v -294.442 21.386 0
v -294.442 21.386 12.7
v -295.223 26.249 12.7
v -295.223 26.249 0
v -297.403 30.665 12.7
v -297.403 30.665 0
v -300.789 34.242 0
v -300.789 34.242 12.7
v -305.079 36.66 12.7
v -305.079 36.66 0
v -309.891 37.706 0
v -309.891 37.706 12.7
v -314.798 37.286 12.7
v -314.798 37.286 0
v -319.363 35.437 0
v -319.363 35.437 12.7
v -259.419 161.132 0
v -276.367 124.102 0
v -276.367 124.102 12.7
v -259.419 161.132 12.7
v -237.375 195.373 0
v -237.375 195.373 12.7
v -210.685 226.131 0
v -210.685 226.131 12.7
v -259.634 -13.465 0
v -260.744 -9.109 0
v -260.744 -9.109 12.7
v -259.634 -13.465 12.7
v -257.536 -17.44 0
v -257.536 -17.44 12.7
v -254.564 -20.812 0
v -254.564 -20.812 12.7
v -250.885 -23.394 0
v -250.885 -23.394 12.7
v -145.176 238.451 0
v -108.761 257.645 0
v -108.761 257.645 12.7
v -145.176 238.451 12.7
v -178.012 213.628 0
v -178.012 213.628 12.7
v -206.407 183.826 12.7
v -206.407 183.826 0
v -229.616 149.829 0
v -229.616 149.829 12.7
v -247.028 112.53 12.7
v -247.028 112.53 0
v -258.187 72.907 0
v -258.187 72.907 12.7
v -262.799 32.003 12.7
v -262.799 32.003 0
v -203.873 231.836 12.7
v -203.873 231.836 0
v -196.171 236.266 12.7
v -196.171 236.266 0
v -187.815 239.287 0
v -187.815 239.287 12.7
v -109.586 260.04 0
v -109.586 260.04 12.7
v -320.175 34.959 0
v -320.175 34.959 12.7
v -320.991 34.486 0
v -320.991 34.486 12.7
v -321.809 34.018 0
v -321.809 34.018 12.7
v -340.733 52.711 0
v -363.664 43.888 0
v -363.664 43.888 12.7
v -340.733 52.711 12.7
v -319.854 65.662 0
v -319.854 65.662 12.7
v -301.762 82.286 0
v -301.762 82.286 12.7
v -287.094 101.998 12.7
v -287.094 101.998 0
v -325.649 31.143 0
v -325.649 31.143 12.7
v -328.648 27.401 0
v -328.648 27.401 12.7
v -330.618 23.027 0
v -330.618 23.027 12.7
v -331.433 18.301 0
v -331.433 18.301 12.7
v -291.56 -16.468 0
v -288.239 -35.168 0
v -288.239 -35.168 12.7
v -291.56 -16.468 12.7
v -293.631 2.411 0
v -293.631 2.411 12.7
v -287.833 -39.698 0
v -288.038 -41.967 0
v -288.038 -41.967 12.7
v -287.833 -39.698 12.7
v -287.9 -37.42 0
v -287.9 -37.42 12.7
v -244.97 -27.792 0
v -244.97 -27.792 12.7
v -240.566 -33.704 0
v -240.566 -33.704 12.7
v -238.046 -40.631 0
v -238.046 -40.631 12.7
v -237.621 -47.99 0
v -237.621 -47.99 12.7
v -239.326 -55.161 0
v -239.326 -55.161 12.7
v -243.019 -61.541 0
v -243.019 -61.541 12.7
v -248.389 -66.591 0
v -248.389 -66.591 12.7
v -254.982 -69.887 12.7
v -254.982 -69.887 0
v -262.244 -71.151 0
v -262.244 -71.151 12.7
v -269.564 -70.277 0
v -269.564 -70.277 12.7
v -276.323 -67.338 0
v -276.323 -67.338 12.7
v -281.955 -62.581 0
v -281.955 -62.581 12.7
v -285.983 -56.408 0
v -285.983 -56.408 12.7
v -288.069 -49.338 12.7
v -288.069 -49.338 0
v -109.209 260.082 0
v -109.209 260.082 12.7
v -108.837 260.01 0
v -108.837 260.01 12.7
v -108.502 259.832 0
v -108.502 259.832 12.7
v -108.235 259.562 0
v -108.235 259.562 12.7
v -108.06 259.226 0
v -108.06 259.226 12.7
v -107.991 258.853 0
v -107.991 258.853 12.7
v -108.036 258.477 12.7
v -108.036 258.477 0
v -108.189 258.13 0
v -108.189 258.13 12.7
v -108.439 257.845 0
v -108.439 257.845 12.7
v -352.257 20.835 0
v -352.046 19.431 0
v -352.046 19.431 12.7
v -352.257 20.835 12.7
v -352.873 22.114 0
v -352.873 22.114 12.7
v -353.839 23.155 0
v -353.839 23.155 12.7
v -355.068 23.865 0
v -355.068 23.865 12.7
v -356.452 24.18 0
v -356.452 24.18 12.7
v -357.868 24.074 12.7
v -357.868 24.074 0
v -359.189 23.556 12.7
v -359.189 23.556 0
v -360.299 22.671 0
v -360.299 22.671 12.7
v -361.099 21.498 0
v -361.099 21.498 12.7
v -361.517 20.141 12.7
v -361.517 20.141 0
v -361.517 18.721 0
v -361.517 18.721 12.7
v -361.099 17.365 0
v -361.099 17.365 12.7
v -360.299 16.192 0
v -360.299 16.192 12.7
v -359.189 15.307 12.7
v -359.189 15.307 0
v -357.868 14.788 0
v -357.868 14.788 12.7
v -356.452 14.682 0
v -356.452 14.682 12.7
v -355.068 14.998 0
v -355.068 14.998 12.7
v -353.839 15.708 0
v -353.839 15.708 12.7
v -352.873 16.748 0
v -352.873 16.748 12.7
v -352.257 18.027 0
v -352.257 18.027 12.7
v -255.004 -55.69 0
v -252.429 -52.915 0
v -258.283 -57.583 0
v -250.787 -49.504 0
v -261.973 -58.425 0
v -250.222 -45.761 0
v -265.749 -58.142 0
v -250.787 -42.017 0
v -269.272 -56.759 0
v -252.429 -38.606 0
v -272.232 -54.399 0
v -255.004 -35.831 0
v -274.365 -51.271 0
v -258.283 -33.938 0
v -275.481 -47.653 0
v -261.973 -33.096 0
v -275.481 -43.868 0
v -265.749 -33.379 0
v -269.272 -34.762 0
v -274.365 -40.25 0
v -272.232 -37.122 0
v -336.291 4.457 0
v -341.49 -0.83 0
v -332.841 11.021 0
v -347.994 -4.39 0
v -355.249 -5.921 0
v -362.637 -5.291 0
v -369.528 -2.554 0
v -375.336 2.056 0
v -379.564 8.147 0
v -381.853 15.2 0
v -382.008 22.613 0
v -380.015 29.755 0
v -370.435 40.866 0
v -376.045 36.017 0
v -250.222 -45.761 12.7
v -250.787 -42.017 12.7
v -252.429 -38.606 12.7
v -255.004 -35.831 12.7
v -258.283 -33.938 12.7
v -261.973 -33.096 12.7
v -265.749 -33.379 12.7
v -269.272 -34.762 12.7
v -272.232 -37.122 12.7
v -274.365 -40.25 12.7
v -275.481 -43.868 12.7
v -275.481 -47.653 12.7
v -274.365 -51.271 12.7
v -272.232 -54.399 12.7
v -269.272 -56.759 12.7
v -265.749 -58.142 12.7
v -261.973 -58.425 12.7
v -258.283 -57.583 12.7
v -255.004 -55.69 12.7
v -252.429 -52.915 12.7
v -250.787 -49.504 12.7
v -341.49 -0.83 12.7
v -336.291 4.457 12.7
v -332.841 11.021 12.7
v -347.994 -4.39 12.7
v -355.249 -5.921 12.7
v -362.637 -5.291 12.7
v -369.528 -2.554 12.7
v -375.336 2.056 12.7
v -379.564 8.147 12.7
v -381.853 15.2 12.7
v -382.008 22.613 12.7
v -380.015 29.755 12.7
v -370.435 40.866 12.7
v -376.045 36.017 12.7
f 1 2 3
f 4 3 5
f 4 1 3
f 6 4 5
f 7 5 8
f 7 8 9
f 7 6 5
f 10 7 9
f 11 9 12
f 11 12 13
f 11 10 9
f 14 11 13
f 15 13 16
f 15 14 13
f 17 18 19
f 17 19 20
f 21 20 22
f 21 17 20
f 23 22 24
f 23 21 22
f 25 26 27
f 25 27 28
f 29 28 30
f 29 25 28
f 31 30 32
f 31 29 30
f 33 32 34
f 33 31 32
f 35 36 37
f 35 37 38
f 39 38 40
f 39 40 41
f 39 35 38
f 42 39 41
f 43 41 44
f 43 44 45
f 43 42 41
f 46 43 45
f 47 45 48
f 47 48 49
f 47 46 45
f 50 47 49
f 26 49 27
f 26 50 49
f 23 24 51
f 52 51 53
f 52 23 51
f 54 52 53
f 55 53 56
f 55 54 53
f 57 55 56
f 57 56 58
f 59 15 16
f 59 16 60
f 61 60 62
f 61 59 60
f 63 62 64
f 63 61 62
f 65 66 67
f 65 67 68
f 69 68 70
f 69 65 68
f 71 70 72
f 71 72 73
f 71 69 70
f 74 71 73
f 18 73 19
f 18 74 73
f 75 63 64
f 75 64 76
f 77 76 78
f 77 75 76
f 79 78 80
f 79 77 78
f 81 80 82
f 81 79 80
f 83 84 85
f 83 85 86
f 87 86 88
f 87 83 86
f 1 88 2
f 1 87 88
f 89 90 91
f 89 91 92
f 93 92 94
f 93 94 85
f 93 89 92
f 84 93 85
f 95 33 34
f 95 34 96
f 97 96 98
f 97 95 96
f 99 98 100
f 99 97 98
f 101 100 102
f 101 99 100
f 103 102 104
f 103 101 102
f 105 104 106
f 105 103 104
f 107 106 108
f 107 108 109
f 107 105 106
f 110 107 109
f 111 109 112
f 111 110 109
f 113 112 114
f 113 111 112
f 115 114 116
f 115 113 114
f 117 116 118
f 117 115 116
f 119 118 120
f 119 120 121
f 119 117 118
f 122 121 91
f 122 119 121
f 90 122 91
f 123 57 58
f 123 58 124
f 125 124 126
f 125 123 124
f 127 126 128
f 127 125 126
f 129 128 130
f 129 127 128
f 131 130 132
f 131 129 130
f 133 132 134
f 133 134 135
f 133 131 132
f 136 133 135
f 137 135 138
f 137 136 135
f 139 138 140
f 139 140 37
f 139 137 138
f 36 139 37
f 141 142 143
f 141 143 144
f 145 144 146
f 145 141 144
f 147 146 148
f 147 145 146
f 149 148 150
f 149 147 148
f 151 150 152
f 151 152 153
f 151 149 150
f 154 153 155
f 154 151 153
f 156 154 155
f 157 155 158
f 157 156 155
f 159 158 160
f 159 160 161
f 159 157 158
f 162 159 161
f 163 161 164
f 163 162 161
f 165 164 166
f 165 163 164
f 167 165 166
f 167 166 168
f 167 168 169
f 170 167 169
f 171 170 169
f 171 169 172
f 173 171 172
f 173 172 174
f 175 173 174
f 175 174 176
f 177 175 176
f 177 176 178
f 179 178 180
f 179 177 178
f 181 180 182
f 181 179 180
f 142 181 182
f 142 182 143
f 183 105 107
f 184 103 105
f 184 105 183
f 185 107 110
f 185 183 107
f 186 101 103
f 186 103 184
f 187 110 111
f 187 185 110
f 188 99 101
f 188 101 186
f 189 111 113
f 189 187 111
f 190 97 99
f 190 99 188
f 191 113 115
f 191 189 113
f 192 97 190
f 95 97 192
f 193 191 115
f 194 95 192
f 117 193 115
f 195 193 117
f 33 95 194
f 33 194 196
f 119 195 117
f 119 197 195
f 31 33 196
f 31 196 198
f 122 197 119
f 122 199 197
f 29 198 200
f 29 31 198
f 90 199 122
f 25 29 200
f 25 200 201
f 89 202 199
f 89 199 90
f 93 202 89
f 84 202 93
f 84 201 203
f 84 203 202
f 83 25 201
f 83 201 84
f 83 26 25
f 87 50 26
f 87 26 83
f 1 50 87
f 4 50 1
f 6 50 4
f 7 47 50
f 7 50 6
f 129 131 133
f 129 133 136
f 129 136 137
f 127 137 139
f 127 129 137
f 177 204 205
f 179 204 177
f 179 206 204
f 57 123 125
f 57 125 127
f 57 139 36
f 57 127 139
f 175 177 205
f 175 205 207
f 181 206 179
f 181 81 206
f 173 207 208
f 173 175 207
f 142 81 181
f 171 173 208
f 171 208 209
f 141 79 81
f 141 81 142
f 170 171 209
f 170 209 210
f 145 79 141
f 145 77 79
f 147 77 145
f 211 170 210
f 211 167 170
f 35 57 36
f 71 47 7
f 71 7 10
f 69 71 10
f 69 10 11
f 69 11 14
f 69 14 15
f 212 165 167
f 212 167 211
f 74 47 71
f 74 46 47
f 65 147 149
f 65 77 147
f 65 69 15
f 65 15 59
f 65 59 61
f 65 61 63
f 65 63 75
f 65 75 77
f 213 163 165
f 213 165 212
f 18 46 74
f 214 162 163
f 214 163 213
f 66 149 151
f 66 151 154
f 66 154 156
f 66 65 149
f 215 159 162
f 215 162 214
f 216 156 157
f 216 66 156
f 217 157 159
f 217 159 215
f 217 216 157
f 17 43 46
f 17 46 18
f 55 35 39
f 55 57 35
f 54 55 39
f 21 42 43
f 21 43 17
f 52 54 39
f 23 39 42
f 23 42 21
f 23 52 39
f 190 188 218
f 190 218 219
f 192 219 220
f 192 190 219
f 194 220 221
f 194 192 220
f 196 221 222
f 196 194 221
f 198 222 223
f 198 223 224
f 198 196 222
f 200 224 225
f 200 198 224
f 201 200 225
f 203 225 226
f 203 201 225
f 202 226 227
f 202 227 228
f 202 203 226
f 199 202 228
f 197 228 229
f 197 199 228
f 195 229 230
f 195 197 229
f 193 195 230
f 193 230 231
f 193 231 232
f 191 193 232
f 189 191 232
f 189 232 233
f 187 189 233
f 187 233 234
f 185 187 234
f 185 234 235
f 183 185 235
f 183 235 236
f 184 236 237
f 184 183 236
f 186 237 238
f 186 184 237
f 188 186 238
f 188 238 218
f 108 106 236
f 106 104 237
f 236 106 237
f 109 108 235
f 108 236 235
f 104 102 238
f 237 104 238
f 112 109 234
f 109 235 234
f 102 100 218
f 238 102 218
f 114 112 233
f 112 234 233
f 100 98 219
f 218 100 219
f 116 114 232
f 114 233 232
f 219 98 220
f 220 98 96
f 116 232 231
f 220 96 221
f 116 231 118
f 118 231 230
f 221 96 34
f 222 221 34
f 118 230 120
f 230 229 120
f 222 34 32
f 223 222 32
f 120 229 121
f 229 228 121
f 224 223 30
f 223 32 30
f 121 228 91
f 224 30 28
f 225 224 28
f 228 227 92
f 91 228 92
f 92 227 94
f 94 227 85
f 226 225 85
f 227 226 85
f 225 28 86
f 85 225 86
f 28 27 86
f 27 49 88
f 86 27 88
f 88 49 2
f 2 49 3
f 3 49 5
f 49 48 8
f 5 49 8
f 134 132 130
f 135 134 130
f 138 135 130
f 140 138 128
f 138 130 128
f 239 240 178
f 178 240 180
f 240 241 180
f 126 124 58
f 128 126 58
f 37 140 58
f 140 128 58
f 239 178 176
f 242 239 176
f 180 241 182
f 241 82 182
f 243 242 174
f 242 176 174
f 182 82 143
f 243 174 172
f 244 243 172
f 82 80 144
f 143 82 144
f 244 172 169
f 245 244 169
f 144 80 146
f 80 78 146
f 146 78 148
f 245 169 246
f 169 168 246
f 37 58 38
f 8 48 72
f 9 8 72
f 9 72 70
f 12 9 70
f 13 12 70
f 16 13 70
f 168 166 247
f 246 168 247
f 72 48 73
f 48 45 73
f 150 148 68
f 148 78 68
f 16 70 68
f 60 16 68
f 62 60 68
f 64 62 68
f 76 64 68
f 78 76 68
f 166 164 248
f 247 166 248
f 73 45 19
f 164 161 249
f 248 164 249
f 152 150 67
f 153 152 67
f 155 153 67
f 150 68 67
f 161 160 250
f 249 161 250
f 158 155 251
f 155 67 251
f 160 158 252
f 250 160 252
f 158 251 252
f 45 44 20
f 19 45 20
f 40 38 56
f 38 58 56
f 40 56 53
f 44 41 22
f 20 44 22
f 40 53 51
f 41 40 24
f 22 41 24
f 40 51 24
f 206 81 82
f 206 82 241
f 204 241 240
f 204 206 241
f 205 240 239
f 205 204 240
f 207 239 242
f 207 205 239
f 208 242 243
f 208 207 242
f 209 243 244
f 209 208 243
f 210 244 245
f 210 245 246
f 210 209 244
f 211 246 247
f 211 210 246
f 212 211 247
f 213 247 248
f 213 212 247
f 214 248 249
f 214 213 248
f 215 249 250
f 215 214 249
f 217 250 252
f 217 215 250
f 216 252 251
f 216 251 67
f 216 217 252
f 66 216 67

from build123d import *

# Parameters (mm, degrees)
SKETCH1_R           = 12.7
SKETCH1_R_2         = 4.7625
BOSS_EXTRUDE1_DEPTH = 12.7


with BuildPart() as part:
    # Sketch1 → Boss-Extrude1 (new body)
    with BuildSketch(Plane.XY):
        with BuildLine():
            Line((-187.814837627, 239.286832502), (-109.585986317, 260.040435914))
            ThreePointArc((-109.585986317, 260.040435914), (-108.059532137, 259.226405199), (-108.761135557, 257.645120591))
            ThreePointArc((-108.761135557, 257.645120591), (-229.615919323, 149.828924192), (-260.74357991, -9.109050224))
            ThreePointArc((-260.74357991, -9.109050224), (-257.535715145, -17.439529004), (-250.885068445, -23.394037509))
            ThreePointArc((-250.885068445, -23.394037509), (-251.565109459, -68.479908862), (-288.037537466, -41.966511367))
            ThreePointArc((-288.037537466, -41.966511367), (-287.832141181, -38.557969421), (-288.238569154, -35.167517809))
            ThreePointArc((-288.238569154, -35.167517809), (-292.752508854, -7.04544043), (-294.442288596, 21.386434854))
            ThreePointArc((-294.442288596, 21.386434854), (-302.842926447, 35.611738456), (-319.362594724, 35.436984704))
            ThreePointArc((-319.362594724, 35.436984704), (-320.58266827, 34.722082272), (-321.809158258, 34.018244753))
            ThreePointArc((-321.809158258, 34.018244753), (-328.648477907, 27.400808215), (-331.433346202, 18.300738536))
            ThreePointArc((-331.433346202, 18.300738536), (-372.60107774, -0.462072999), (-363.664476838, 43.888376615))
            ThreePointArc((-363.664476838, 43.888376615), (-310.417085479, 73.549005343), (-276.36661221, 124.101976107))
            ThreePointArc((-276.36661221, 124.101976107), (-249.008169348, 178.646013909), (-210.684679592, 226.131238859))
            ThreePointArc((-210.684679592, 226.131238859), (-200.118731843, 234.219669183), (-187.814837627, 239.286832502))
        make_face()
        with Locations((-262.922494985, -45.760538404)):
            Circle(SKETCH1_R, mode=Mode.SUBTRACT)
        with Locations((-356.808175222, 19.431248244)):
            Circle(SKETCH1_R_2, mode=Mode.SUBTRACT)
    extrude(amount=BOSS_EXTRUDE1_DEPTH)


solid = part.part
